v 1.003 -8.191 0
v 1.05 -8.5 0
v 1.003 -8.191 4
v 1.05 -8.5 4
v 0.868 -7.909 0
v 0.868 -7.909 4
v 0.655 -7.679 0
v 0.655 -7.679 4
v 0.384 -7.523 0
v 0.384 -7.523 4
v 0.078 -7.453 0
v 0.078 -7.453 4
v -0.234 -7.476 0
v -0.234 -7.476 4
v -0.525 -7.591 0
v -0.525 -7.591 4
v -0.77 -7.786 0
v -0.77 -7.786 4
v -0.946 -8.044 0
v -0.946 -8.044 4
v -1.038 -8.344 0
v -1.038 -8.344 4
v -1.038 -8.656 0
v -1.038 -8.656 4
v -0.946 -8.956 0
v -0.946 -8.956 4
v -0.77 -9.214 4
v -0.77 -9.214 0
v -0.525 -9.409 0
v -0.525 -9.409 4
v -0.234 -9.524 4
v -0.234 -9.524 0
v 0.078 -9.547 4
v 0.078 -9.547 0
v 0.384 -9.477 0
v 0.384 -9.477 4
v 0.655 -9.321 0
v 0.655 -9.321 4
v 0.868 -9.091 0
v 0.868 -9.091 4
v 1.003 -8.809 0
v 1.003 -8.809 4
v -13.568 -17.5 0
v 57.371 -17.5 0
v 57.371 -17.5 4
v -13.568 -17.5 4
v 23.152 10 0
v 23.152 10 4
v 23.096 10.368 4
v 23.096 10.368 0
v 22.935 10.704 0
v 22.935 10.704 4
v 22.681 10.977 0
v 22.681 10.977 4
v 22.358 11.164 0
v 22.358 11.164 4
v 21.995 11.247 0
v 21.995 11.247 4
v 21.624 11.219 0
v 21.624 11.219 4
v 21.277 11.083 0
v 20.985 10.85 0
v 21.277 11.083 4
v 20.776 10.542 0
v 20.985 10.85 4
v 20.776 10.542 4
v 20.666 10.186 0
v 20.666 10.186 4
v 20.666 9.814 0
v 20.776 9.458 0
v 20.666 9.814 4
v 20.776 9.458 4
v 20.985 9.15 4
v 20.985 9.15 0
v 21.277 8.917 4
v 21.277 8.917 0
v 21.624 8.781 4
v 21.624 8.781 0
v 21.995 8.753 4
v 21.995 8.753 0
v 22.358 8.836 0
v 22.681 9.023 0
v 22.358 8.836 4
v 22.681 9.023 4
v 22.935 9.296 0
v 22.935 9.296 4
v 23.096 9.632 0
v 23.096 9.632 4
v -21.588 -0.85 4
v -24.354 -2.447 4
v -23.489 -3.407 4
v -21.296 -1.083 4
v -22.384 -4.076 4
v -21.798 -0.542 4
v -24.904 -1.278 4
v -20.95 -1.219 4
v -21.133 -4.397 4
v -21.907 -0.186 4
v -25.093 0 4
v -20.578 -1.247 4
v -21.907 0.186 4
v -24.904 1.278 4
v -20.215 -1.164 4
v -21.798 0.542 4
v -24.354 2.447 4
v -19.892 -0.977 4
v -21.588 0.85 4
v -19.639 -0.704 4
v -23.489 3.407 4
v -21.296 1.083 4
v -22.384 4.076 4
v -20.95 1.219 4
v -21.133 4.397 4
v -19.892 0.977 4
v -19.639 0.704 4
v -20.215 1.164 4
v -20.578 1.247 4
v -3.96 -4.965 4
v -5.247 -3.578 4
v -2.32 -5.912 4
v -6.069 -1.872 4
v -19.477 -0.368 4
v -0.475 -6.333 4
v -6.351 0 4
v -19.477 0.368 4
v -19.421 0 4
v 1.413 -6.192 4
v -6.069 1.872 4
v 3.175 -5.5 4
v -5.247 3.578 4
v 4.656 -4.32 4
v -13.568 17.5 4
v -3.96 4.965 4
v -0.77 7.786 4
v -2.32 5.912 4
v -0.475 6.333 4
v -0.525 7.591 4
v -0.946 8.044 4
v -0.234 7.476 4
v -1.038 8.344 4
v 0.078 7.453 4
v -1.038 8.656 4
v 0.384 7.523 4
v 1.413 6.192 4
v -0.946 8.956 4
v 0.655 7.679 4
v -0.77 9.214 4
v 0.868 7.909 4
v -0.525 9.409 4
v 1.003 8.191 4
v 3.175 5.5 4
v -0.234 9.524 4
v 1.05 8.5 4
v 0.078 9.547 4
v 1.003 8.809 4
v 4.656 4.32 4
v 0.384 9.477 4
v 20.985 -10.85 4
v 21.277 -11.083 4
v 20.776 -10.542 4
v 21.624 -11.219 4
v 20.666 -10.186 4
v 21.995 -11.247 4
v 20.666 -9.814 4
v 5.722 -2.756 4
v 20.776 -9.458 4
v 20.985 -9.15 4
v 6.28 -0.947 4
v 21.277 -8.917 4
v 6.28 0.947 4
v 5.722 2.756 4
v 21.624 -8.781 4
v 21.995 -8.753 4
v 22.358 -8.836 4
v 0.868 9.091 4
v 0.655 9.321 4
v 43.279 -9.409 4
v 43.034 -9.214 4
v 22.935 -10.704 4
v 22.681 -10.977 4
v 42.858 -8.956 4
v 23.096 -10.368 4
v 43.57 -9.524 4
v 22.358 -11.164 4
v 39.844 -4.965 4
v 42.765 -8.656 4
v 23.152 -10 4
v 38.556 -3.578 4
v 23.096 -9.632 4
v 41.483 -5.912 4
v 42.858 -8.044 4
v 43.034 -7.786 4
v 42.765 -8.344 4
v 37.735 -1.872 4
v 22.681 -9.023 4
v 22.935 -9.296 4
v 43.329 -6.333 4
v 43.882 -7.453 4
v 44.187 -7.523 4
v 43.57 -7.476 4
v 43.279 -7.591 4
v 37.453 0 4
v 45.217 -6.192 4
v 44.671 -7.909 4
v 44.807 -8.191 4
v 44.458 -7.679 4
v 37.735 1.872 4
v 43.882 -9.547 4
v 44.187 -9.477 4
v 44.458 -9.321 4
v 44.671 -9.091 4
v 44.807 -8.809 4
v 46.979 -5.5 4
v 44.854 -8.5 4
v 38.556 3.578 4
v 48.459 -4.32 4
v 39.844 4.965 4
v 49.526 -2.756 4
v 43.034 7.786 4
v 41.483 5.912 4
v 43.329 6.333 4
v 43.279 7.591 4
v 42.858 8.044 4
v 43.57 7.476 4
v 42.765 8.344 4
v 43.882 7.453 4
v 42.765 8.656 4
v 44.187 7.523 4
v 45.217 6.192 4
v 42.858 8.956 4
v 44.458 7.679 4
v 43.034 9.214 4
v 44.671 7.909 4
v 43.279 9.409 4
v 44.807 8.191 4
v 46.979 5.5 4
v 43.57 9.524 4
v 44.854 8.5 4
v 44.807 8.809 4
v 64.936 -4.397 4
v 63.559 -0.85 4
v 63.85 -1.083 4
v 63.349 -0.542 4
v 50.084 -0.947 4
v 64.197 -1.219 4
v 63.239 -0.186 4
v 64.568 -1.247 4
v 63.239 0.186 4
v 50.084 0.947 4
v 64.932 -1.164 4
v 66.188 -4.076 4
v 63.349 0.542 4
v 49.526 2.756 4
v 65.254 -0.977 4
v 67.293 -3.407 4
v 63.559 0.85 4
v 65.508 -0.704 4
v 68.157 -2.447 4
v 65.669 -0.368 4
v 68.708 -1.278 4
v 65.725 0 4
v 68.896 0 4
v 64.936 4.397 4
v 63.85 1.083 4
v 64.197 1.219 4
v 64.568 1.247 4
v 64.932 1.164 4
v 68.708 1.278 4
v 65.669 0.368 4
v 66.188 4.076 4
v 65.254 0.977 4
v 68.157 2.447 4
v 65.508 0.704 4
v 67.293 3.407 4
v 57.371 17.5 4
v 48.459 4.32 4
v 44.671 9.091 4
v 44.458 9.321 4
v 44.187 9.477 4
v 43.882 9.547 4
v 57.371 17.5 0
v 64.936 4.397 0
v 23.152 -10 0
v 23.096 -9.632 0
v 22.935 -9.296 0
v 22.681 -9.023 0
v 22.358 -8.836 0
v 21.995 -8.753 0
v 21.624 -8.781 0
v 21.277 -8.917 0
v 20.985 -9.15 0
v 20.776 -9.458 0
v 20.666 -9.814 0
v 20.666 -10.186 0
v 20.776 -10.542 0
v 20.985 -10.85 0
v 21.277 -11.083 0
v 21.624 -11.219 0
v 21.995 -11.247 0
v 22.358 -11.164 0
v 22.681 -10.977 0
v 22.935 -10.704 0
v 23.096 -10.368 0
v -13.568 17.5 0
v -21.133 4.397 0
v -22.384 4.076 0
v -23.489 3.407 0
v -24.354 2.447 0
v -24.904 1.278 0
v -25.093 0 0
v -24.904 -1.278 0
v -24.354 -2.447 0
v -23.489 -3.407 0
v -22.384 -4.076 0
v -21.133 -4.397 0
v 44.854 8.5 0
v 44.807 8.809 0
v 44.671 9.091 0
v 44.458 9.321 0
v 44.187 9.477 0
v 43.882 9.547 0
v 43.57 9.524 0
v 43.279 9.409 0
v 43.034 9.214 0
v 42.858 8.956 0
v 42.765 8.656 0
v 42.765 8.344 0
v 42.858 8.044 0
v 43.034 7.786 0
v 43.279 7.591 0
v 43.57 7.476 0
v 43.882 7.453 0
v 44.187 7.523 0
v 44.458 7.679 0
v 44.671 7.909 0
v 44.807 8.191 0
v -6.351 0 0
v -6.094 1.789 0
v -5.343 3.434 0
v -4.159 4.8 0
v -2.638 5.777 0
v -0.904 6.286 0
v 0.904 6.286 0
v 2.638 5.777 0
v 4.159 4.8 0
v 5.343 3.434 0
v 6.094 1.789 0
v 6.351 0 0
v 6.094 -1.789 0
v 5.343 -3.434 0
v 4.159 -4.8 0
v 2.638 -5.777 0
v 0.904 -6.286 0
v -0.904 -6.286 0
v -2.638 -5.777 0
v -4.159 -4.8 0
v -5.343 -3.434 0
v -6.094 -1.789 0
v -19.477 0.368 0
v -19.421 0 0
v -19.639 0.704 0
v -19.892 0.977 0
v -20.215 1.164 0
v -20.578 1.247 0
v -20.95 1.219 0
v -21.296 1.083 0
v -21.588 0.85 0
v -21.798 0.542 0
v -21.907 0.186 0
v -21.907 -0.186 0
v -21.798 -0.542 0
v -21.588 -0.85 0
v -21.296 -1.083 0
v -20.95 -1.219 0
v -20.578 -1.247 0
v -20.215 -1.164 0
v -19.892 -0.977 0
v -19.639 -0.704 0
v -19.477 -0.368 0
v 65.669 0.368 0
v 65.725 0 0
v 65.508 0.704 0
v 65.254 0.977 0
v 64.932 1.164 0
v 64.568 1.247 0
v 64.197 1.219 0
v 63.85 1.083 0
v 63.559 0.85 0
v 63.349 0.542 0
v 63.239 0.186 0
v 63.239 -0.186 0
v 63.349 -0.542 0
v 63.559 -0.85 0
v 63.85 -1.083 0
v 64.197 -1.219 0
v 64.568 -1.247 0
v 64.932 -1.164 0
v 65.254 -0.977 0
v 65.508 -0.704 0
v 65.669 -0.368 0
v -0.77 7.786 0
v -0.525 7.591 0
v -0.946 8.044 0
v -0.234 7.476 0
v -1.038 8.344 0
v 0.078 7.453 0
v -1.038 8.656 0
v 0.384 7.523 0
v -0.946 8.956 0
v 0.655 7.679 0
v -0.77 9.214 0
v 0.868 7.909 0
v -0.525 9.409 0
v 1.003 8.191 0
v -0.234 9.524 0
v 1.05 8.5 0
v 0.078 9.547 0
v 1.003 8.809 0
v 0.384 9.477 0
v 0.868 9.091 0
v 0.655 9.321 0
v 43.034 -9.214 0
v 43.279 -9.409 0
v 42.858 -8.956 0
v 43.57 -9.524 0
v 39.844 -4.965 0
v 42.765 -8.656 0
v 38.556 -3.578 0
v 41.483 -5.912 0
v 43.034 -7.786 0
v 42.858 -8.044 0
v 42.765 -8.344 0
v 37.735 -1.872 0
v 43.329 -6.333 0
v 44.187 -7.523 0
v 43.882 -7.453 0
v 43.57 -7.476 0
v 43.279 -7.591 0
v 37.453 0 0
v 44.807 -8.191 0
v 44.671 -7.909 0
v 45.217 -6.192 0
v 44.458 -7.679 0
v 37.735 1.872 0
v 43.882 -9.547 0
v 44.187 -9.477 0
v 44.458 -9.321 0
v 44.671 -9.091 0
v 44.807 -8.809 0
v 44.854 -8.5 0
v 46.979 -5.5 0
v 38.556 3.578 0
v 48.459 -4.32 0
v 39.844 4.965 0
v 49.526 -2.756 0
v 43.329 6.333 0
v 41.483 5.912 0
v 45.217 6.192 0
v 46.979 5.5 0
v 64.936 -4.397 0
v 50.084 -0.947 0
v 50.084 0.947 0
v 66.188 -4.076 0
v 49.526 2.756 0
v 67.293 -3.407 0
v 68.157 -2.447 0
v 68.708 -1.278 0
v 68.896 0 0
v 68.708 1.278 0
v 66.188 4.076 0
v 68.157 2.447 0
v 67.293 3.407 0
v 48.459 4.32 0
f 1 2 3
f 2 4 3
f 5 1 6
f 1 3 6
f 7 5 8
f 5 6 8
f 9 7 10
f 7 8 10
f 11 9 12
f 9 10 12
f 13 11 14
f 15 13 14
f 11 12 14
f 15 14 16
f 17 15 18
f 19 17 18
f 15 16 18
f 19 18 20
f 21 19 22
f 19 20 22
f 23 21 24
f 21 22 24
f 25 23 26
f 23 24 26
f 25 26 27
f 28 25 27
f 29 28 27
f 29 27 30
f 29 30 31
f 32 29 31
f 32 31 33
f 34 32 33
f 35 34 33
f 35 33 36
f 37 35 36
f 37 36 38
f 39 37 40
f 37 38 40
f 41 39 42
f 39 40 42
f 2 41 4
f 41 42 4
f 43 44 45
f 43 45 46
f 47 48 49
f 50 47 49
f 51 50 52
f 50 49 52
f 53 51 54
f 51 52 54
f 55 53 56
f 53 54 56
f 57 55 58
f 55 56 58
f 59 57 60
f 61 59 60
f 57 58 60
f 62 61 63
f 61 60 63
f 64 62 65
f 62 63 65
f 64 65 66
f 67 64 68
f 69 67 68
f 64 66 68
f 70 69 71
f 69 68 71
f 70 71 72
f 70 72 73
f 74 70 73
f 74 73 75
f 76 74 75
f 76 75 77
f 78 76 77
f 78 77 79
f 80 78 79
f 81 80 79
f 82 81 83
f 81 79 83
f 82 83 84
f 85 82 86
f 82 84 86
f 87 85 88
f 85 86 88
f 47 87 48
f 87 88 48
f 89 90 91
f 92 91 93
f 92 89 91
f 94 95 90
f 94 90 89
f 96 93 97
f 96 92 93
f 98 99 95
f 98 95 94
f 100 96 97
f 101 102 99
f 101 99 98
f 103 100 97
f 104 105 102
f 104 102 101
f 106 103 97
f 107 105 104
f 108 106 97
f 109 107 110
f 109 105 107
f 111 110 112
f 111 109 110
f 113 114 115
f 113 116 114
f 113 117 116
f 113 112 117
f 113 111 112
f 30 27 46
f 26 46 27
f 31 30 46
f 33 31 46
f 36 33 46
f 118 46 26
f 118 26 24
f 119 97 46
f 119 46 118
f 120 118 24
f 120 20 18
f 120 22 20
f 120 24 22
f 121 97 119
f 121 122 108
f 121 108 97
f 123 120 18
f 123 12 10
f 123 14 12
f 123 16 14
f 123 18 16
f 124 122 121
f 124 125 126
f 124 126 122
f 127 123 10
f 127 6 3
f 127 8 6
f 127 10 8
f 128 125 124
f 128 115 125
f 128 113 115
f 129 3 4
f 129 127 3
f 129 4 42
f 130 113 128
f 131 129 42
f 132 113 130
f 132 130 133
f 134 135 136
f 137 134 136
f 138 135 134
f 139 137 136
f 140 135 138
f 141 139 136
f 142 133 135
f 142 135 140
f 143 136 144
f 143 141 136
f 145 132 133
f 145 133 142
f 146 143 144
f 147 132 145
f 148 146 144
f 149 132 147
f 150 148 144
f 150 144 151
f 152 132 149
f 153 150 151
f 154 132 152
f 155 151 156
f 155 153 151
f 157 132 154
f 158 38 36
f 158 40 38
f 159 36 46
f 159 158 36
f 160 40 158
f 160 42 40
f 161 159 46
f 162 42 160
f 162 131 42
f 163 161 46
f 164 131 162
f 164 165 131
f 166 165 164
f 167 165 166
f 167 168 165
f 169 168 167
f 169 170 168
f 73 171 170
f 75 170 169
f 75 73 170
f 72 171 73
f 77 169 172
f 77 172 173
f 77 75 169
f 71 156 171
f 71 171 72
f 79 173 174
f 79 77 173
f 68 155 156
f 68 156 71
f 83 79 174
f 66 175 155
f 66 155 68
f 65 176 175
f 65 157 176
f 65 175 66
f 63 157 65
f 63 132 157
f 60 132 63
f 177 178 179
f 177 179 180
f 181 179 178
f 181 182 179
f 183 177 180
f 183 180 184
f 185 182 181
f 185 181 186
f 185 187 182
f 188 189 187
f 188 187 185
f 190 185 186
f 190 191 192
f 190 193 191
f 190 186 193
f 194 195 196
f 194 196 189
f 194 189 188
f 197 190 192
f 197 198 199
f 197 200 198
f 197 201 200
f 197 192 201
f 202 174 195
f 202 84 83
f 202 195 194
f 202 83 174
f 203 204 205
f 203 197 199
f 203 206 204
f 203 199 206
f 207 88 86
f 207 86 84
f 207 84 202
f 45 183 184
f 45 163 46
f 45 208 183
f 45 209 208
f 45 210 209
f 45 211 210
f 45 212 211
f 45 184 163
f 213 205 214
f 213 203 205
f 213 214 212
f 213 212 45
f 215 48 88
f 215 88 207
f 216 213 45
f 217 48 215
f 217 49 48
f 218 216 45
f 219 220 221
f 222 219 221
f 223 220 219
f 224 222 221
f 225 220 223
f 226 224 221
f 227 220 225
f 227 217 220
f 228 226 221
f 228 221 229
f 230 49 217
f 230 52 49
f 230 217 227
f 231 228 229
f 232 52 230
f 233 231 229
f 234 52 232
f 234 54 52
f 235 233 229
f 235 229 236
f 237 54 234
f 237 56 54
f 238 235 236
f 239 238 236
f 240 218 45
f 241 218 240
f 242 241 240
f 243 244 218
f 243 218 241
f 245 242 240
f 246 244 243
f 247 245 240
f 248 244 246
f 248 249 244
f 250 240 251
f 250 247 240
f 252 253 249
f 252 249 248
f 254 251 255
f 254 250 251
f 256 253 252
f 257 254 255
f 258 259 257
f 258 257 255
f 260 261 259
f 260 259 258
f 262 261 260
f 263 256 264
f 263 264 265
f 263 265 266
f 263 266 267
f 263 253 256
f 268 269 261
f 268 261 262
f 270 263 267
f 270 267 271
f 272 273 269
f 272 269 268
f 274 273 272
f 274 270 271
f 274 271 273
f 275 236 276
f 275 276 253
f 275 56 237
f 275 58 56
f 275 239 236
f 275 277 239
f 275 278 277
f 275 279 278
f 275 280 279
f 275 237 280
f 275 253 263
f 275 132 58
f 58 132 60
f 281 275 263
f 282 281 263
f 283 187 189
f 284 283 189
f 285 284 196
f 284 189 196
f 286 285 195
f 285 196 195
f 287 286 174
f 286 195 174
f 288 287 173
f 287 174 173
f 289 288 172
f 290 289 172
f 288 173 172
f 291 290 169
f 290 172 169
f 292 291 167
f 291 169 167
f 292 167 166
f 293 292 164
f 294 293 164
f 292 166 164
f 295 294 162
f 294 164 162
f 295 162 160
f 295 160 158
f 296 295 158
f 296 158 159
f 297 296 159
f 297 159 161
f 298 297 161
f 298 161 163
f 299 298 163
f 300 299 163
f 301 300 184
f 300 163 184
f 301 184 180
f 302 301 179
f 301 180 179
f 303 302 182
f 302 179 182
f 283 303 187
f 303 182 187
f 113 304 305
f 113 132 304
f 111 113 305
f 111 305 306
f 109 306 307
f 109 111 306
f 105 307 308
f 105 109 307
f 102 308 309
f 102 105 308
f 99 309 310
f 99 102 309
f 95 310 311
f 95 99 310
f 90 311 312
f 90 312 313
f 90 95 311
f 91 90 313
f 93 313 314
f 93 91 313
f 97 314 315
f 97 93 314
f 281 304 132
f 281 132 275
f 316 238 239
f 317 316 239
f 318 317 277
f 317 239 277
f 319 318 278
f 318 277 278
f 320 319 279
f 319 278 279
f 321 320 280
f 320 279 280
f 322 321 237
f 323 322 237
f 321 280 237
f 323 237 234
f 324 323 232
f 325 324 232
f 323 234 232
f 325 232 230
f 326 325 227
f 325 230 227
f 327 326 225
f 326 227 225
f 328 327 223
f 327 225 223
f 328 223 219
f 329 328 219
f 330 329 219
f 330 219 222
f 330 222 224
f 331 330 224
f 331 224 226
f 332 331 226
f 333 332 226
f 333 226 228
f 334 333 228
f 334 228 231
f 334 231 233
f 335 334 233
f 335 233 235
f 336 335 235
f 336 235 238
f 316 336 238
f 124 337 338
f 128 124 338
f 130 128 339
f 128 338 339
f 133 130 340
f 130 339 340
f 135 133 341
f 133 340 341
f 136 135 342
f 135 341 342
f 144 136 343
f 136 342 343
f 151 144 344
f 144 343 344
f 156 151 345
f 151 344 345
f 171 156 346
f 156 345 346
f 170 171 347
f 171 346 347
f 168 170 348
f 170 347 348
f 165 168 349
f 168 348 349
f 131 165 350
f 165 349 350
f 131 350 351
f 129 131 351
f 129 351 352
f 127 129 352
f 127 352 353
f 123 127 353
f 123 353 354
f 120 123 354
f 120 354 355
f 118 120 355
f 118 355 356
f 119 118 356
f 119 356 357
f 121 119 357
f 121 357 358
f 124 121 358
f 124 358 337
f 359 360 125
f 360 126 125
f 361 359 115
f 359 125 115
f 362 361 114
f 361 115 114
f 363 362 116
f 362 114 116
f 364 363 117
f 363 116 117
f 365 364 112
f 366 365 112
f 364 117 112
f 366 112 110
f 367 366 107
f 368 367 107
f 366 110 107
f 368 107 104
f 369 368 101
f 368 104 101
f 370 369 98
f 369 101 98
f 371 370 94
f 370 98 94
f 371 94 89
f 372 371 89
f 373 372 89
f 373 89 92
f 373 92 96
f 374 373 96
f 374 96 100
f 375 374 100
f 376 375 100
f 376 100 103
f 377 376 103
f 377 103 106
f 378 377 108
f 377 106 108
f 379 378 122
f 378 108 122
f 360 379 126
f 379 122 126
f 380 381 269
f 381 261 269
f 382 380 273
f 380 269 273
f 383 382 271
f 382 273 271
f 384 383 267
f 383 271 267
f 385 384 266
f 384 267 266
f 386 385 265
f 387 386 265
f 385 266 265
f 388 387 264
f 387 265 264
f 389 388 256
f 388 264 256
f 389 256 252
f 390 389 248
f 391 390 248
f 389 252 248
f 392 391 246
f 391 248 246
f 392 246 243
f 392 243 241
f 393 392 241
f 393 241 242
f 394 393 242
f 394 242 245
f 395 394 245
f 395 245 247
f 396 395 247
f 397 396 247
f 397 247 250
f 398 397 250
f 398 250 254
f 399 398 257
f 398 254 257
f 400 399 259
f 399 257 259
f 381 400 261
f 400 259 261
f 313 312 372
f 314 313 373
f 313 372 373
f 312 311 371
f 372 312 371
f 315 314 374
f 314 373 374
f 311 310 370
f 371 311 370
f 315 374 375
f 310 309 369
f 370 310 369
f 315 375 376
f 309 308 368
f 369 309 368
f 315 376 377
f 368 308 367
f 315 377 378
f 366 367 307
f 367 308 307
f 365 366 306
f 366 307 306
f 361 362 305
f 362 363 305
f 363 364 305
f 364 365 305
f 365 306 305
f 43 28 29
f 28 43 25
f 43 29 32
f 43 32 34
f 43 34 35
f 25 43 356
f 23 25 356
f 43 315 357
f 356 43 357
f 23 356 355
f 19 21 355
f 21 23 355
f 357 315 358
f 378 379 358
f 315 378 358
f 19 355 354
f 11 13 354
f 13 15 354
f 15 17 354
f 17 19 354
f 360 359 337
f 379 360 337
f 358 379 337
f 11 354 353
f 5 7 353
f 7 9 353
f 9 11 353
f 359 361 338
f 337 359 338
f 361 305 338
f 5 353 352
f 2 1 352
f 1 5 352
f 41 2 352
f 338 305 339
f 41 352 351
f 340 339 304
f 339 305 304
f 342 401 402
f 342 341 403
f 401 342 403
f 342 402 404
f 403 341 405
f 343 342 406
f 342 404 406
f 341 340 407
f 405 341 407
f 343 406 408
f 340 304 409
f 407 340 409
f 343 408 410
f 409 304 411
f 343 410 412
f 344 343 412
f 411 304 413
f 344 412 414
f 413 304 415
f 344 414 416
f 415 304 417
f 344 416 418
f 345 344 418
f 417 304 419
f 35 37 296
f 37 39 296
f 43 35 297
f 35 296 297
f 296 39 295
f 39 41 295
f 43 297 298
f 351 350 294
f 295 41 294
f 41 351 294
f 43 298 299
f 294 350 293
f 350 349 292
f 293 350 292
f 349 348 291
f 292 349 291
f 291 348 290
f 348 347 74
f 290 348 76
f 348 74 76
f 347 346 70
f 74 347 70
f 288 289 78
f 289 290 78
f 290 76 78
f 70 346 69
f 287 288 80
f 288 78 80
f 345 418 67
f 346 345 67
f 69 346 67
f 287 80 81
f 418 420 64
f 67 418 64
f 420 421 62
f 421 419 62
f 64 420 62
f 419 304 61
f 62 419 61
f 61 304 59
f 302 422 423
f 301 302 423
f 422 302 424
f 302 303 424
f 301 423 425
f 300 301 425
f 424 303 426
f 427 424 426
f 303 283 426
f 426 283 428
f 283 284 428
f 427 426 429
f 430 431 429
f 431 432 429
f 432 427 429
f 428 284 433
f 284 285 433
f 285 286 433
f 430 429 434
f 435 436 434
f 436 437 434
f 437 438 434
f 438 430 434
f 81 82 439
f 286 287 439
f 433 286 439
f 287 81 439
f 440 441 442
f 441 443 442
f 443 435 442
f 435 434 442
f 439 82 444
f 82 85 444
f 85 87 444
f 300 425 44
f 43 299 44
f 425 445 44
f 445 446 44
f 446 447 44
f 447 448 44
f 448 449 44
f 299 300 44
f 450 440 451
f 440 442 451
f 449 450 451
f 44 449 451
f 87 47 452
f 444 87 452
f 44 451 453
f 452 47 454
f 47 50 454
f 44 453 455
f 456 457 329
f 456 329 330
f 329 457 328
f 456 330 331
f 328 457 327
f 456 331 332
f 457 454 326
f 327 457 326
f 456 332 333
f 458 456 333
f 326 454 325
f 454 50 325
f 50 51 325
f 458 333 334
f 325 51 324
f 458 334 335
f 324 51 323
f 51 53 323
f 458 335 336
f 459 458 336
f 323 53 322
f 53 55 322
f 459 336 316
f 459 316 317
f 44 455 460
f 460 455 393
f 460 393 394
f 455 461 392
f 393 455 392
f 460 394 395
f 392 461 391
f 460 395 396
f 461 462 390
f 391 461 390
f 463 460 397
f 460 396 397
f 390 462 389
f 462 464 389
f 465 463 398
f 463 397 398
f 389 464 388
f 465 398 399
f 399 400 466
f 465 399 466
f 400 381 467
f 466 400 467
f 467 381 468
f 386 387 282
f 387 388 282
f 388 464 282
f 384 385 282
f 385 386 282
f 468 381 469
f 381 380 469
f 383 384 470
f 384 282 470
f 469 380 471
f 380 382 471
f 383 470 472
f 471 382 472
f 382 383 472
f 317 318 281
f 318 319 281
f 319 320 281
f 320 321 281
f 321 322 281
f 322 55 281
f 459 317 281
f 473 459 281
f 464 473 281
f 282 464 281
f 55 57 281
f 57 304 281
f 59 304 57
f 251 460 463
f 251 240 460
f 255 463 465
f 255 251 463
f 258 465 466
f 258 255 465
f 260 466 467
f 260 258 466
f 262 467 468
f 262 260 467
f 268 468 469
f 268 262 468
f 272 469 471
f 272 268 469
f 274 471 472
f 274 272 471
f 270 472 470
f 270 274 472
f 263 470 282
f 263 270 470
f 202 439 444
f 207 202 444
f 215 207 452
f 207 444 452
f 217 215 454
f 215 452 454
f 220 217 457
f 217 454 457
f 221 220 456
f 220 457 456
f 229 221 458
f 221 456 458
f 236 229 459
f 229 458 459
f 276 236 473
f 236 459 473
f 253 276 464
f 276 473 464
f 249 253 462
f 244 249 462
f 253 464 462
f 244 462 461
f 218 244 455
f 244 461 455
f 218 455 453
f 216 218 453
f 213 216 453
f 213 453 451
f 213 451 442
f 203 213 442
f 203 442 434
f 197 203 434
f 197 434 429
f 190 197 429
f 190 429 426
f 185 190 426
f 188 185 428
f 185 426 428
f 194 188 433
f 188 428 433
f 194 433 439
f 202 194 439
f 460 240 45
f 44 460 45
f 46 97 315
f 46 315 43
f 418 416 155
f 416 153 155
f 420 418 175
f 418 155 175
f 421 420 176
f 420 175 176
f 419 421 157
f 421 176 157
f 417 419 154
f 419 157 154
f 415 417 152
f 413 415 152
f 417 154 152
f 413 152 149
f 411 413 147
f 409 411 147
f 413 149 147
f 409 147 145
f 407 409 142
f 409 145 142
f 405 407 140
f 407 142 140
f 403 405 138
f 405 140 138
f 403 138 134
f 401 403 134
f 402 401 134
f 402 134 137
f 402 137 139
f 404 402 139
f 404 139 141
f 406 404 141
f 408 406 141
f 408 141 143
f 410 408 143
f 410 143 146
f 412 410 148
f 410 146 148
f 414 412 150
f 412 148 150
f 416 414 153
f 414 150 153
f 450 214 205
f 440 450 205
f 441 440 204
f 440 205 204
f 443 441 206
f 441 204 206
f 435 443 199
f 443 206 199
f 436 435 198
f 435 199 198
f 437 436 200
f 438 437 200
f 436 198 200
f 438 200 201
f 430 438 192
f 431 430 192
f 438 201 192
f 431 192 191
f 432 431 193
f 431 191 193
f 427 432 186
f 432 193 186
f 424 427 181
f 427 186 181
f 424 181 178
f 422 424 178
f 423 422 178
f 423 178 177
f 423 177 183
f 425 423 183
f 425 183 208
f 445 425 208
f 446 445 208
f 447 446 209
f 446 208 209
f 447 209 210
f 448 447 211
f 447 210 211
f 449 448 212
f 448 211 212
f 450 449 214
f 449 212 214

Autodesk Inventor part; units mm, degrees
ref_plane "YZ Plane" through (0, 0, 0) normal (1, 0, 0) x (0, 1, 0)
ref_plane "XZ Plane" through (0, 0, 0) normal (0, 1, 0) x (-1, 0, 0)
ref_plane "XY Plane" through (0, 0, 0) normal (0, 0, 1) x (1, 0, 0)
sketch "Sketch1" plane through (0, 0, 0) normal (0, 0, 1) x (1, 0, 0)
  circle A0 centre (0, 0) radius 3.5
  circle A1 centre (43.8036, 0) radius 3.5
  line L0 (-20.2073, 0) -> (-10.1036, 17.5)
  line L1 (-10.1036, 17.5) -> (10.1036, 17.5)
  line L2 (10.1036, 17.5) -> (20.2073, 0)
  line L3 (20.2073, 0) -> (10.1036, -17.5)
  line L4 (10.1036, -17.5) -> (-10.1036, -17.5)
  line L5 (-10.1036, -17.5) -> (-20.2073, 0)
  line L6 (64.0108, 0) -> (53.9072, -17.5)
  line L7 (53.9072, -17.5) -> (33.6999, -17.5)
  line L8 (33.6999, -17.5) -> (23.5963, 0)
  line L9 (23.5963, 0) -> (33.6999, 17.5)
  line L10 (33.6999, 17.5) -> (53.9072, 17.5)
  line L11 (53.9072, 17.5) -> (64.0108, 0)
  line L12 (10.1036, 17.5) -> (33.6999, 17.5)
  line L13 (10.1036, -17.5) -> (33.6999, -17.5)
  dimension "d0" = 7
  dimension "d1" = 7
  dimension "d2" = 43.8036
  dimension "d3" = 35
extrude "Extrusion1" add sketch "Sketch1" along normal blind 4 contours A0 | L0 L1 L2 L3 L4 L5 | L12 L9 L8 L13 L3 L2 | L10 L11 L6 L7 L8 L9
sketch "Sketch2" plane through (0, 0, 4) normal (0, 0, 1) x (1, 0, 0)
  circle A0 centre (43.8036, 0) radius 3.5 projected
  circle A1 centre (0, 0) radius 3.5 projected
  line L0 (-10.1036, 17.5) -> (-20.2073, 0) projected
  line L1 (-20.2073, 0) -> (-10.1036, -17.5) projected
  line L2 (53.9072, -17.5) -> (64.0108, 0) projected
  line L3 (64.0108, 0) -> (53.9072, 17.5) projected
  line L4 (57.3713, 17.5) -> (67.4749, 0)
  line L5 (67.4749, 0) -> (57.3713, -17.5)
  line L6 (-13.5677, 17.5) -> (-23.6714, 0)
  line L7 (-23.6714, 0) -> (-13.5677, -17.5)
  line L8 (53.9072, 17.5) -> (-10.1036, 17.5) projected
  line L9 (-10.1036, 17.5) -> (-13.5677, 17.5)
  line L10 (-13.5677, -17.5) -> (-10.1036, -17.5)
  line L11 (-10.1036, -17.5) -> (53.9072, -17.5) projected
  line L12 (53.9072, -17.5) -> (57.3713, -17.5)
  line L13 (64.0108, 0) -> (53.9072, 17.5) projected
  line L14 (53.9072, 17.5) -> (57.3713, 17.5)
  point P0 (-11.8357, -17.5)
  dimension "d6" = 3
  dimension "d7" = 3
extrude "Extrusion2" add sketch "Sketch2" against normal up to surface (4 mm away) from surface at 0 contours L0 L1 L10 L7 L6 L9 | L14 L4 L5 L12 L2 L3
sketch "Sketch3" plane through (0, 0, 4) normal (0, 0, 1) x (1, 0, 0)
  circle A0 centre (-20.6714, 0) radius 1.25
  circle A1 centre (64.4749, 0) radius 1.25
  circle A2 centre (21.9018, 10) radius 1.25
  circle A3 centre (21.9018, -10) radius 1.25
  line L0 (21.9018, 10) -> (21.9018, -10)
  line L1 (-13.5677, 17.5) -> (57.3713, 17.5) projected
  line L2 (-20.6714, 0) -> (64.4749, 0)
  point P0 (0, 0)
  point P1 (21.9018, 17.5)
  point P2 (-10.1036, 17.5)
  point P3 (21.9018, 17.5)
  point P4 (21.9018, 0)
  dimension "d10" = 2.5
  dimension "d11" = 2.5
  dimension "d12" = 2.5
  dimension "d13" = 2.5
  dimension "d14" = 20
  dimension "d34" = 85.1463
extrude "Extrusion3" cut sketch "Sketch3" against normal through all
sketch "Sketch4" plane through (0, 0, 4) normal (0, 0, 1) x (1, 0, 0)
  line L0 (0, 8.5) -> (0, -8.5) construction
  line L1 (43.8036, 8.5) -> (43.8036, -8.5) construction
  circle A0 centre (43.8036, 0) radius 3.5 construction
  circle A1 centre (0, 0) radius 3.5 construction
  circle A2 centre (0, 8.5) radius 1.05
  circle A3 centre (0, -8.5) radius 1.05
  circle A4 centre (43.8036, -8.5) radius 1.05
  circle A5 centre (43.8036, 8.5) radius 1.05
  dimension "d19" = 17
  dimension "d20" = 17
  dimension "d21" = 2.1
  dimension "d22" = 2.1
  dimension "d23" = 2.1
  dimension "d24" = 2.1
extrude "Extrusion4" cut sketch "Sketch4" against normal through all
sketch "Sketch8" plane through (0, 0, 4) normal (0, 0, 1) x (1, 0, 0)
  circle A0 centre (-20.6714, 0) radius 1.25 projected
  circle A1 centre (-20.6714, 0) radius 4.4214
  circle A2 centre (64.4749, 0) radius 1.25 projected
  circle A3 centre (64.4749, 0) radius 4.4214
  point P0 (0, 0)
  dimension "d30" = 8.8427
  dimension "d31" = 8.8427
extrude "Extrusion5" add sketch "Sketch8" against normal up to surface (4 mm away) from surface at 0
sketch "Sketch9" plane through (0, 0, 0) normal (0, 0, -1) x (-1, 0, 0)
  line L0 (6.3509, 0) -> (3.1754, -5.5)
  line L1 (3.1754, -5.5) -> (-3.1754, -5.5)
  line L2 (-3.1754, -5.5) -> (-6.3509, 0)
  line L3 (-6.3509, 0) -> (-3.1754, 5.5)
  line L4 (-3.1754, 5.5) -> (3.1754, 5.5)
  line L5 (3.1754, 5.5) -> (6.3509, 0)
  circle A0 centre (-43.8036, 0) radius 3.5
  line L6 (-37.4527, 0) -> (-40.6281, -5.5)
  line L7 (-40.6281, -5.5) -> (-46.979, -5.5)
  line L8 (-46.979, -5.5) -> (-50.1544, 0)
  line L9 (-50.1544, 0) -> (-46.979, 5.5)
  line L10 (-46.979, 5.5) -> (-40.6281, 5.5)
  line L11 (-40.6281, 5.5) -> (-37.4527, 0)
  circle A1 centre (-43.8036, 0) radius 3.5 projected
  circle A2 centre (0, 0) radius 3.5 projected
  dimension "d35" = 11
  dimension "d36" = 11
extrude "Extrusion6" cut sketch "Sketch9" against normal blind 2 contours L0 L1 L2 L3 L4 L5 | A0 | L6 L7 L8 L9 L10 L11 | A2
sketch "Sketch10" plane through (0, 0, 0) normal (0, 0, -1) x (-1, 0, 0)
  line L0 (3.1754, 5.5) -> (6.3509, 0) projected
  circle A0 centre (0, 0) radius 6.3509
  circle A1 centre (-43.8036, 0) radius 3.5 projected
  line L1 (-37.4527, 0) -> (-40.6281, -5.5) projected
  circle A2 centre (-43.8036, 0) radius 6.3509
extrude "Extrusion7" cut sketch "Sketch10" against normal through all contours A0 L0 | L0 A0 | A1 | A2 L1 | L1 A2
equation "\"d7\" = d6"
equation "\"d31\" = d30"
properties part number "AC09" material "ABS Plastic"
